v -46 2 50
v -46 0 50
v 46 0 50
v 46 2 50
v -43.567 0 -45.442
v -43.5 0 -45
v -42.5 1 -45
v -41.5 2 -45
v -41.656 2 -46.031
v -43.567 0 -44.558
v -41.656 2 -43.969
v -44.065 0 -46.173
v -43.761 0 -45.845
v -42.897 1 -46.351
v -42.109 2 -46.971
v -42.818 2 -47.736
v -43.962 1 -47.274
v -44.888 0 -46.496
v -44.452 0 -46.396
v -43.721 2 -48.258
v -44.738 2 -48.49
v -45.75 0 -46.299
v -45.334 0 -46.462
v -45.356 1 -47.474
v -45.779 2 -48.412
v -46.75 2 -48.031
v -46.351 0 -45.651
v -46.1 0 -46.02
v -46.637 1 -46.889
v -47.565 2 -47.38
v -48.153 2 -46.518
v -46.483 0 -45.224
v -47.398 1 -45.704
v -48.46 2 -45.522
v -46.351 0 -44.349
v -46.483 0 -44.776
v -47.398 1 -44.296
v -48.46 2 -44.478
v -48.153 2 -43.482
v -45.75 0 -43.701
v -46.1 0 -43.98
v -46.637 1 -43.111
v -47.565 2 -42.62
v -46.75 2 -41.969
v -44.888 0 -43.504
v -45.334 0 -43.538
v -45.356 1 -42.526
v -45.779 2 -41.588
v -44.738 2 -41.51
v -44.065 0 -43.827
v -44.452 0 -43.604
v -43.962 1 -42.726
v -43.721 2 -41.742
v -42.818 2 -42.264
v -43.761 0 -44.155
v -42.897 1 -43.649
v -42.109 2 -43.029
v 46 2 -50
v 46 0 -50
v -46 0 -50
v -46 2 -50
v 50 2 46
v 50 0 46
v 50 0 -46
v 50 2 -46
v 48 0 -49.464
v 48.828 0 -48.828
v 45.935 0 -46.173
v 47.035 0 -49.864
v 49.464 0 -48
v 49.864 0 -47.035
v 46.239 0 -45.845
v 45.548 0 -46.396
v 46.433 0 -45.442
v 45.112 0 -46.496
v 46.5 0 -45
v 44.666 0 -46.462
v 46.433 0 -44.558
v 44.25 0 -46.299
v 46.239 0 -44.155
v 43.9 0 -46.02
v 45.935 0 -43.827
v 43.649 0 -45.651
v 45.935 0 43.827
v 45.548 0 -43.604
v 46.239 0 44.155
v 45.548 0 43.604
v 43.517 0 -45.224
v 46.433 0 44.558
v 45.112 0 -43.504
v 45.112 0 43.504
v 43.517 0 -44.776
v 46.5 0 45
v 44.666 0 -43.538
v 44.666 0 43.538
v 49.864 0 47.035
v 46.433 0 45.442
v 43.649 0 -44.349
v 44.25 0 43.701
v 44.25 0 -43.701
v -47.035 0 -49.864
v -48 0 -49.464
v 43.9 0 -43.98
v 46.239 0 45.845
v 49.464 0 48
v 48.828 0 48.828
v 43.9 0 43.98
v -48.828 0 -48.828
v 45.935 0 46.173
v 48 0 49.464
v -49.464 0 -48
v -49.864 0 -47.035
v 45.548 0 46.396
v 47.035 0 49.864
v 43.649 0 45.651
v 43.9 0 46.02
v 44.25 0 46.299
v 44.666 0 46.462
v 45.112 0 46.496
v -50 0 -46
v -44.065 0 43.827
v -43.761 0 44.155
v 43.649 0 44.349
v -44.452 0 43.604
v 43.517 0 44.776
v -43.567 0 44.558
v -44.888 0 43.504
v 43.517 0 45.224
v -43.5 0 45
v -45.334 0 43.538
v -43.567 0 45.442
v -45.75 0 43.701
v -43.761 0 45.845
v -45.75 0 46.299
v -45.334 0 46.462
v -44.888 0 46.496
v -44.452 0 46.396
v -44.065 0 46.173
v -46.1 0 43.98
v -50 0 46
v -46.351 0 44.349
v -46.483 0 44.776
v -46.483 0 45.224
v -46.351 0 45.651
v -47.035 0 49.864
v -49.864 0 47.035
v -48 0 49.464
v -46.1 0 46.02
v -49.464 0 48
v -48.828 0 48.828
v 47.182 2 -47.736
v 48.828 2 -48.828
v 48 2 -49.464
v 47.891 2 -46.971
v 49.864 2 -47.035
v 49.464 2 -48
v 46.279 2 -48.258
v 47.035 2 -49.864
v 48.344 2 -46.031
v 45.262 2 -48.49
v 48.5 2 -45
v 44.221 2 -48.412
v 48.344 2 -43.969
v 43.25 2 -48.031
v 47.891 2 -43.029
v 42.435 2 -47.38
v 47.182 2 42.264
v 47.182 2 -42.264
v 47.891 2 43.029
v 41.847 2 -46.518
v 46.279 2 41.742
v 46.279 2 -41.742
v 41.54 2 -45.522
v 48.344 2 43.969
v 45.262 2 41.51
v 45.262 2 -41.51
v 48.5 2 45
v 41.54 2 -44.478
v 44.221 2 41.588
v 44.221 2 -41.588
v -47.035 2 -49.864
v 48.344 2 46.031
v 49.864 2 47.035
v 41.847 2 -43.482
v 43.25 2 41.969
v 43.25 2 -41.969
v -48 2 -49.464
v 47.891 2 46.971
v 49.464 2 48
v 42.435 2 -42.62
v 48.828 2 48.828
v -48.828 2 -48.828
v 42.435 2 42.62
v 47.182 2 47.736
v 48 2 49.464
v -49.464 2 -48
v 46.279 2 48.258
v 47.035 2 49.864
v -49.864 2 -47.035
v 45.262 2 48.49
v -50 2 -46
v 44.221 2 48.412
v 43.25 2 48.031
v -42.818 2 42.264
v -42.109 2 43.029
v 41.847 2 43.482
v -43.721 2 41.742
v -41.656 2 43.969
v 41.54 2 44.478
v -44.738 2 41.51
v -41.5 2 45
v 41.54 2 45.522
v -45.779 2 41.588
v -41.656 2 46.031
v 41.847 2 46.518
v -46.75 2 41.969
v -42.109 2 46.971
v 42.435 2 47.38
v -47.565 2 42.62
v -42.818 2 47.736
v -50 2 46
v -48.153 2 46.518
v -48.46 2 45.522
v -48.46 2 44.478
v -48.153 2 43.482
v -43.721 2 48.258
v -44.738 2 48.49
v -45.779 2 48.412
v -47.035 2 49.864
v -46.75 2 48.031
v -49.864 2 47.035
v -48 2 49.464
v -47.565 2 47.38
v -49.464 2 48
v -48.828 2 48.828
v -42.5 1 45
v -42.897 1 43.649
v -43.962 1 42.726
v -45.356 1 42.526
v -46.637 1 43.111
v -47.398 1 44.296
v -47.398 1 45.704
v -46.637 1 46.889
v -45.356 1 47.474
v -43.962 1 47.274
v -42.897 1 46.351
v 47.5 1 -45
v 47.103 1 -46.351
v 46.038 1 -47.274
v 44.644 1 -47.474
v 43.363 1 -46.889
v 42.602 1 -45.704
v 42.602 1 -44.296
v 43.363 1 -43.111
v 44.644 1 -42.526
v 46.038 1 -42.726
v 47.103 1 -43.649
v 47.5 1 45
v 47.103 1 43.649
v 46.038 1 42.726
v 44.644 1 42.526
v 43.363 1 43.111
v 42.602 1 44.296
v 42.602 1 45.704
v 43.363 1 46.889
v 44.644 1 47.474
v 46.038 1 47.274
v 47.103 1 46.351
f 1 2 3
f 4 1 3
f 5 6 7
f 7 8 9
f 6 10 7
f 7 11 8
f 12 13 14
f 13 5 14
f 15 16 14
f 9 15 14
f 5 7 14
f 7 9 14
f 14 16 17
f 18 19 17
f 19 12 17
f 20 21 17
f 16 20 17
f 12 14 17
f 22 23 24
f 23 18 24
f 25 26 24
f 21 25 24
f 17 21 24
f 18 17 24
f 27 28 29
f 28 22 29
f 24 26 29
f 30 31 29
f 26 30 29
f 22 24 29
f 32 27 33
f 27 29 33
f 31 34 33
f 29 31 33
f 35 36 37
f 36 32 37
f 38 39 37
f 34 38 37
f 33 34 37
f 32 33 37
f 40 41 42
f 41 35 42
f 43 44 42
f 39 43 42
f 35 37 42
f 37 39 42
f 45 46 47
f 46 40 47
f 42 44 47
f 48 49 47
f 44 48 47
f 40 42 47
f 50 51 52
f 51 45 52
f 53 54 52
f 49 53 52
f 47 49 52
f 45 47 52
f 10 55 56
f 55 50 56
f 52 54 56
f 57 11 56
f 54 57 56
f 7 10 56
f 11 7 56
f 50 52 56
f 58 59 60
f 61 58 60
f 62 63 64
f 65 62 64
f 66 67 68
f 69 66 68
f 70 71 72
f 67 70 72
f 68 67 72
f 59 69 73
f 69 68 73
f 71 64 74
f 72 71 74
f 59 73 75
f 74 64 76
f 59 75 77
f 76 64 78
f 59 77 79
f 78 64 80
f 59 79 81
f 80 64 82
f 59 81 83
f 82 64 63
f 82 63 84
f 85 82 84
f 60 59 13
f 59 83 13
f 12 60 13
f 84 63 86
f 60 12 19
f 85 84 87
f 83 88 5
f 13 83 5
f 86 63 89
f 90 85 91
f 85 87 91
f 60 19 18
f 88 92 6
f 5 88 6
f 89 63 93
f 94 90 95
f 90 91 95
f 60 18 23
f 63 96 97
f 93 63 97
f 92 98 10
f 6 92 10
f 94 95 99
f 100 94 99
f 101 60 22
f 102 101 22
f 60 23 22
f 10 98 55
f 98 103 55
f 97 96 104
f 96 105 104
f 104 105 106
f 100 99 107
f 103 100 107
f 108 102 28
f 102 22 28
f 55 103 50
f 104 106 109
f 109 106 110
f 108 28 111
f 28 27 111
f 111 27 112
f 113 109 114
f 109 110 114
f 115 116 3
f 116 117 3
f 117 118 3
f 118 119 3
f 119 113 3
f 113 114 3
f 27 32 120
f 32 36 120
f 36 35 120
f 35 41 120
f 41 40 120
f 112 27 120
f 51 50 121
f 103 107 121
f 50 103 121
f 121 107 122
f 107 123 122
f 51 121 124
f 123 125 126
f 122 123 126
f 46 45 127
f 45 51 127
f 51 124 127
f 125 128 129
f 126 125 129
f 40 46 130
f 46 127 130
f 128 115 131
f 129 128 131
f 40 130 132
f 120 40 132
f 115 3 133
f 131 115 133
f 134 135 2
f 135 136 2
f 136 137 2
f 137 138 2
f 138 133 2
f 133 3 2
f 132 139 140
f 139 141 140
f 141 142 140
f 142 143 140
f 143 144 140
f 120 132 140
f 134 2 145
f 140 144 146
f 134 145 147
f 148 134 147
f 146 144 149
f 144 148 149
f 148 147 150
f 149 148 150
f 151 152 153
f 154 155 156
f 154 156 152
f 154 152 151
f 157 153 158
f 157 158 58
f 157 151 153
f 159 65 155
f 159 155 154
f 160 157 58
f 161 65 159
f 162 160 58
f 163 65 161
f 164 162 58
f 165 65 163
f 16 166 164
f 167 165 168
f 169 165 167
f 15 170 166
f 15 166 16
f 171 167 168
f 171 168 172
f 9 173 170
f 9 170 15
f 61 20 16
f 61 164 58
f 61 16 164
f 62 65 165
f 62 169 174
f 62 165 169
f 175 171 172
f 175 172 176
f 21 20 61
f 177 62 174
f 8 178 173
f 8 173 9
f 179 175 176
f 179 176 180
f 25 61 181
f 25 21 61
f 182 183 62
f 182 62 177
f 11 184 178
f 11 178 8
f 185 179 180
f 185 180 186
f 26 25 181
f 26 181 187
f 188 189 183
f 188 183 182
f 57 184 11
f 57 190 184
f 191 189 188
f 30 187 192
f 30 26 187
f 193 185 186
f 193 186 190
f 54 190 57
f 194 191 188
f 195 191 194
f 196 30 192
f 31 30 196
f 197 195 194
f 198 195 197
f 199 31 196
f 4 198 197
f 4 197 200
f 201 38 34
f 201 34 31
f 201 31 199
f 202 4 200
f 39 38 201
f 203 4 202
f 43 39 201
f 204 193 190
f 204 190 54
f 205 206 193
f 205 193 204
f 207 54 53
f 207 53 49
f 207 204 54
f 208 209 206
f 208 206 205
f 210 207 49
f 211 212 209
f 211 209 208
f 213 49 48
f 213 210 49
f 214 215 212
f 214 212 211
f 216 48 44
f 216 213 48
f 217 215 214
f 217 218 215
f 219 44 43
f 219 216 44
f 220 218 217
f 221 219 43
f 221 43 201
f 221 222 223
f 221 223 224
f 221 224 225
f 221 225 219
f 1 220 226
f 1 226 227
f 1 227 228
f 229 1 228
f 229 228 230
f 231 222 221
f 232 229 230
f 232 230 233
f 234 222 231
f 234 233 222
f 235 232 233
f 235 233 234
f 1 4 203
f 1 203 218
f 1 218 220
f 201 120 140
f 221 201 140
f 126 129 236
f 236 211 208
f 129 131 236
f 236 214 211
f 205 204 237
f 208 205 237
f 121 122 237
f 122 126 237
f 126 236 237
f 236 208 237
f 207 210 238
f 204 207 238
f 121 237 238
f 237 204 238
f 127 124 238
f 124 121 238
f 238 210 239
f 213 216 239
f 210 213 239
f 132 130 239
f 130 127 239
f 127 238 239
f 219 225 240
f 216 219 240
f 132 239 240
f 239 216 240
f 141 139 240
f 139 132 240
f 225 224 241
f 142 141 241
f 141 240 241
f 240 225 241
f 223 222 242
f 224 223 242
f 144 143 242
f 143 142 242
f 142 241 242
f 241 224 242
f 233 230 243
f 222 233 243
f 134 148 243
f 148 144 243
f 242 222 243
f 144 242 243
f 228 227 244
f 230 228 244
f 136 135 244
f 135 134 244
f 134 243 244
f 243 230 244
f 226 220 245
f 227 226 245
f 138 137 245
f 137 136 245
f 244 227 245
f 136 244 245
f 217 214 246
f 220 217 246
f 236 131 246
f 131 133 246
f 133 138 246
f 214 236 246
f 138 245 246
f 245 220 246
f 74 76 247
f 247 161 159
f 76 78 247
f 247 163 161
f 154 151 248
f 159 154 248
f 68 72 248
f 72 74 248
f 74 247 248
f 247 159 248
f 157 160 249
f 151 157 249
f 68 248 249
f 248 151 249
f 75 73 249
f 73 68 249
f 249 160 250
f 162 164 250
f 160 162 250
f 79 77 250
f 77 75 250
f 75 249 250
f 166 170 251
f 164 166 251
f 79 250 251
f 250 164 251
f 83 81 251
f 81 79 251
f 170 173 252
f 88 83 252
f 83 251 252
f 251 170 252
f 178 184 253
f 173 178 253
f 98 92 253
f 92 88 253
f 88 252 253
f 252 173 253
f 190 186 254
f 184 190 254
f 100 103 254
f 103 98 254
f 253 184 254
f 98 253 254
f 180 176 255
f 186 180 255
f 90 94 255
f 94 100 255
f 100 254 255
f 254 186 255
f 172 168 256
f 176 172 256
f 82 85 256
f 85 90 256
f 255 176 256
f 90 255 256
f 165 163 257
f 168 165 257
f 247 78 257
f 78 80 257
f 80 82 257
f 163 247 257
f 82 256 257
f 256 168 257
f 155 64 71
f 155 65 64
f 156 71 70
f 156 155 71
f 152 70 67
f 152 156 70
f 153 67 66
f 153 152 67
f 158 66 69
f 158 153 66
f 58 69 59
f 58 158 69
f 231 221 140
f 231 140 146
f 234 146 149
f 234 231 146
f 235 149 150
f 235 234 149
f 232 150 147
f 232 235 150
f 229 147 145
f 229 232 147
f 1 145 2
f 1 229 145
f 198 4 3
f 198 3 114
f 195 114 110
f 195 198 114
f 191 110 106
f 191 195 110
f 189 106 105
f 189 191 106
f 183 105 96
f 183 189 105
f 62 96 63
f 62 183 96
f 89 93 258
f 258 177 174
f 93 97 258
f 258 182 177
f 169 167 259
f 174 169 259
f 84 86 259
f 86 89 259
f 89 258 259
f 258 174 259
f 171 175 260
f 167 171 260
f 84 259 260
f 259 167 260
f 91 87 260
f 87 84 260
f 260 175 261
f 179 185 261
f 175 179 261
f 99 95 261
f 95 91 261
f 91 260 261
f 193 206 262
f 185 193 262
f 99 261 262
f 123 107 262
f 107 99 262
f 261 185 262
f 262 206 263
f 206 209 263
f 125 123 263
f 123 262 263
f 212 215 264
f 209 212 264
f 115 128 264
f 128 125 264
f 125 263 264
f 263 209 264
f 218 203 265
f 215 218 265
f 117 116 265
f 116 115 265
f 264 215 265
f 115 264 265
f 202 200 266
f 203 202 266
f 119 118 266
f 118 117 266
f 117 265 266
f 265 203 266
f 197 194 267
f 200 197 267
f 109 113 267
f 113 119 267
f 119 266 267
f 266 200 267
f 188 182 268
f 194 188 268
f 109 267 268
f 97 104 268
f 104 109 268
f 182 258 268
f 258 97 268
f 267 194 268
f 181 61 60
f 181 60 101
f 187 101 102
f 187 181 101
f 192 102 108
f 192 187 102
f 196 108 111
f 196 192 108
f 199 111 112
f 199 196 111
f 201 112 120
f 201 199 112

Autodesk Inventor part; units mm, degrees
ref_plane "YZ Plane" through (0, 0, 0) normal (1, 0, 0) x (0, 1, 0)
ref_plane "XZ Plane" through (0, 0, 0) normal (0, 1, 0) x (-1, 0, 0)
ref_plane "XY Plane" through (0, 0, 0) normal (0, 0, 1) x (1, 0, 0)
sketch "Szkic1" plane through (0, 0, 0) normal (0, 1, 0) x (-1, 0, 0)
  line L0 (-50, -50) -> (50, -50)
  line L1 (50, -50) -> (50, 50)
  line L2 (50, 50) -> (-50, 50)
  line L3 (-50, 50) -> (-50, -50)
  line L4 (-50, -50) -> (50, 50) construction
  line L5 (50, -50) -> (-50, 50) construction
  point P0 (0, 0)
  dimension "d0" = 100
  dimension "d1" = 100
extrude "Wyciągnięcie proste1" add sketch "Szkic1" along normal blind 2
sketch "Szkic2" plane through (0, 2, 0) normal (0, 1, 0) x (1, 0, 0)
  line L0 (-45, -45) -> (45, -45)
  line L1 (45, -45) -> (45, 45)
  line L2 (45, 45) -> (-45, 45)
  line L3 (-45, 45) -> (-45, -45)
  line L4 (-45, -45) -> (45, 45) construction
  line L5 (45, -45) -> (-45, 45) construction
  circle A0 centre (-45, 45) radius 1.5
  circle A1 centre (-45, -45) radius 1.5
  circle A2 centre (45, -45) radius 1.5
  circle A3 centre (45, 45) radius 1.5
  point P0 (0, 0)
  dimension "d4" = 90
  dimension "d5" = 90
  dimension "d6" = 3
  dimension "d7" = 3
  dimension "d8" = 3
  dimension "d9" = 3
extrude "Wyciągnięcie proste2" cut sketch "Szkic2" against normal blind 3 contours L3 A1 L0 | L0 A1 L3 | A2 L1 L0 | L0 L1 A2 | A0 L2 L3 | L3 L2 A0 | A3 L2 L1 | L1 L2 A3
chamfer "Faza1" distance 2 angle 45 4 edges at (-46.5, 2, 45) (-46.5, 2, -45) (43.5, 2, -45) (43.5, 2, 45)
fillet "Zaokrąglenie1" radius 4 4 edges at (50, 1, -50) (50, 1, 50) (-50, 1, 50) (-50, 1, -50)
sketch "Szkic3" plane through (0, 2, 0) normal (0, 1, 0) x (1, 0, 0)
  circle A0 centre (45, 45) radius 3.5 projected
  circle A1 centre (-45, -45) radius 3.5 projected
  arc A2 (-46, 50) -> (-50, 46) centre (-46, 46) ccw projected
  line L0 (-50, 46) -> (-50, -46) projected
  arc A3 (-50, -46) -> (-46, -50) centre (-46, -46) ccw projected
  line L1 (-46, -50) -> (46, -50) projected
  arc A4 (46, -50) -> (50, -46) centre (46, -46) ccw projected
  line L2 (50, -46) -> (50, 46) projected
  arc A5 (50, 46) -> (46, 50) centre (46, 46) ccw projected
  line L3 (46, 50) -> (-46, 50) projected
  circle A6 centre (-45, 45) radius 3.5 projected
  circle A7 centre (45, -45) radius 3.5 projected
  point P0 (0, 0)
equation "\"d10\" = d8"
properties part number "logo e-laska 2"
